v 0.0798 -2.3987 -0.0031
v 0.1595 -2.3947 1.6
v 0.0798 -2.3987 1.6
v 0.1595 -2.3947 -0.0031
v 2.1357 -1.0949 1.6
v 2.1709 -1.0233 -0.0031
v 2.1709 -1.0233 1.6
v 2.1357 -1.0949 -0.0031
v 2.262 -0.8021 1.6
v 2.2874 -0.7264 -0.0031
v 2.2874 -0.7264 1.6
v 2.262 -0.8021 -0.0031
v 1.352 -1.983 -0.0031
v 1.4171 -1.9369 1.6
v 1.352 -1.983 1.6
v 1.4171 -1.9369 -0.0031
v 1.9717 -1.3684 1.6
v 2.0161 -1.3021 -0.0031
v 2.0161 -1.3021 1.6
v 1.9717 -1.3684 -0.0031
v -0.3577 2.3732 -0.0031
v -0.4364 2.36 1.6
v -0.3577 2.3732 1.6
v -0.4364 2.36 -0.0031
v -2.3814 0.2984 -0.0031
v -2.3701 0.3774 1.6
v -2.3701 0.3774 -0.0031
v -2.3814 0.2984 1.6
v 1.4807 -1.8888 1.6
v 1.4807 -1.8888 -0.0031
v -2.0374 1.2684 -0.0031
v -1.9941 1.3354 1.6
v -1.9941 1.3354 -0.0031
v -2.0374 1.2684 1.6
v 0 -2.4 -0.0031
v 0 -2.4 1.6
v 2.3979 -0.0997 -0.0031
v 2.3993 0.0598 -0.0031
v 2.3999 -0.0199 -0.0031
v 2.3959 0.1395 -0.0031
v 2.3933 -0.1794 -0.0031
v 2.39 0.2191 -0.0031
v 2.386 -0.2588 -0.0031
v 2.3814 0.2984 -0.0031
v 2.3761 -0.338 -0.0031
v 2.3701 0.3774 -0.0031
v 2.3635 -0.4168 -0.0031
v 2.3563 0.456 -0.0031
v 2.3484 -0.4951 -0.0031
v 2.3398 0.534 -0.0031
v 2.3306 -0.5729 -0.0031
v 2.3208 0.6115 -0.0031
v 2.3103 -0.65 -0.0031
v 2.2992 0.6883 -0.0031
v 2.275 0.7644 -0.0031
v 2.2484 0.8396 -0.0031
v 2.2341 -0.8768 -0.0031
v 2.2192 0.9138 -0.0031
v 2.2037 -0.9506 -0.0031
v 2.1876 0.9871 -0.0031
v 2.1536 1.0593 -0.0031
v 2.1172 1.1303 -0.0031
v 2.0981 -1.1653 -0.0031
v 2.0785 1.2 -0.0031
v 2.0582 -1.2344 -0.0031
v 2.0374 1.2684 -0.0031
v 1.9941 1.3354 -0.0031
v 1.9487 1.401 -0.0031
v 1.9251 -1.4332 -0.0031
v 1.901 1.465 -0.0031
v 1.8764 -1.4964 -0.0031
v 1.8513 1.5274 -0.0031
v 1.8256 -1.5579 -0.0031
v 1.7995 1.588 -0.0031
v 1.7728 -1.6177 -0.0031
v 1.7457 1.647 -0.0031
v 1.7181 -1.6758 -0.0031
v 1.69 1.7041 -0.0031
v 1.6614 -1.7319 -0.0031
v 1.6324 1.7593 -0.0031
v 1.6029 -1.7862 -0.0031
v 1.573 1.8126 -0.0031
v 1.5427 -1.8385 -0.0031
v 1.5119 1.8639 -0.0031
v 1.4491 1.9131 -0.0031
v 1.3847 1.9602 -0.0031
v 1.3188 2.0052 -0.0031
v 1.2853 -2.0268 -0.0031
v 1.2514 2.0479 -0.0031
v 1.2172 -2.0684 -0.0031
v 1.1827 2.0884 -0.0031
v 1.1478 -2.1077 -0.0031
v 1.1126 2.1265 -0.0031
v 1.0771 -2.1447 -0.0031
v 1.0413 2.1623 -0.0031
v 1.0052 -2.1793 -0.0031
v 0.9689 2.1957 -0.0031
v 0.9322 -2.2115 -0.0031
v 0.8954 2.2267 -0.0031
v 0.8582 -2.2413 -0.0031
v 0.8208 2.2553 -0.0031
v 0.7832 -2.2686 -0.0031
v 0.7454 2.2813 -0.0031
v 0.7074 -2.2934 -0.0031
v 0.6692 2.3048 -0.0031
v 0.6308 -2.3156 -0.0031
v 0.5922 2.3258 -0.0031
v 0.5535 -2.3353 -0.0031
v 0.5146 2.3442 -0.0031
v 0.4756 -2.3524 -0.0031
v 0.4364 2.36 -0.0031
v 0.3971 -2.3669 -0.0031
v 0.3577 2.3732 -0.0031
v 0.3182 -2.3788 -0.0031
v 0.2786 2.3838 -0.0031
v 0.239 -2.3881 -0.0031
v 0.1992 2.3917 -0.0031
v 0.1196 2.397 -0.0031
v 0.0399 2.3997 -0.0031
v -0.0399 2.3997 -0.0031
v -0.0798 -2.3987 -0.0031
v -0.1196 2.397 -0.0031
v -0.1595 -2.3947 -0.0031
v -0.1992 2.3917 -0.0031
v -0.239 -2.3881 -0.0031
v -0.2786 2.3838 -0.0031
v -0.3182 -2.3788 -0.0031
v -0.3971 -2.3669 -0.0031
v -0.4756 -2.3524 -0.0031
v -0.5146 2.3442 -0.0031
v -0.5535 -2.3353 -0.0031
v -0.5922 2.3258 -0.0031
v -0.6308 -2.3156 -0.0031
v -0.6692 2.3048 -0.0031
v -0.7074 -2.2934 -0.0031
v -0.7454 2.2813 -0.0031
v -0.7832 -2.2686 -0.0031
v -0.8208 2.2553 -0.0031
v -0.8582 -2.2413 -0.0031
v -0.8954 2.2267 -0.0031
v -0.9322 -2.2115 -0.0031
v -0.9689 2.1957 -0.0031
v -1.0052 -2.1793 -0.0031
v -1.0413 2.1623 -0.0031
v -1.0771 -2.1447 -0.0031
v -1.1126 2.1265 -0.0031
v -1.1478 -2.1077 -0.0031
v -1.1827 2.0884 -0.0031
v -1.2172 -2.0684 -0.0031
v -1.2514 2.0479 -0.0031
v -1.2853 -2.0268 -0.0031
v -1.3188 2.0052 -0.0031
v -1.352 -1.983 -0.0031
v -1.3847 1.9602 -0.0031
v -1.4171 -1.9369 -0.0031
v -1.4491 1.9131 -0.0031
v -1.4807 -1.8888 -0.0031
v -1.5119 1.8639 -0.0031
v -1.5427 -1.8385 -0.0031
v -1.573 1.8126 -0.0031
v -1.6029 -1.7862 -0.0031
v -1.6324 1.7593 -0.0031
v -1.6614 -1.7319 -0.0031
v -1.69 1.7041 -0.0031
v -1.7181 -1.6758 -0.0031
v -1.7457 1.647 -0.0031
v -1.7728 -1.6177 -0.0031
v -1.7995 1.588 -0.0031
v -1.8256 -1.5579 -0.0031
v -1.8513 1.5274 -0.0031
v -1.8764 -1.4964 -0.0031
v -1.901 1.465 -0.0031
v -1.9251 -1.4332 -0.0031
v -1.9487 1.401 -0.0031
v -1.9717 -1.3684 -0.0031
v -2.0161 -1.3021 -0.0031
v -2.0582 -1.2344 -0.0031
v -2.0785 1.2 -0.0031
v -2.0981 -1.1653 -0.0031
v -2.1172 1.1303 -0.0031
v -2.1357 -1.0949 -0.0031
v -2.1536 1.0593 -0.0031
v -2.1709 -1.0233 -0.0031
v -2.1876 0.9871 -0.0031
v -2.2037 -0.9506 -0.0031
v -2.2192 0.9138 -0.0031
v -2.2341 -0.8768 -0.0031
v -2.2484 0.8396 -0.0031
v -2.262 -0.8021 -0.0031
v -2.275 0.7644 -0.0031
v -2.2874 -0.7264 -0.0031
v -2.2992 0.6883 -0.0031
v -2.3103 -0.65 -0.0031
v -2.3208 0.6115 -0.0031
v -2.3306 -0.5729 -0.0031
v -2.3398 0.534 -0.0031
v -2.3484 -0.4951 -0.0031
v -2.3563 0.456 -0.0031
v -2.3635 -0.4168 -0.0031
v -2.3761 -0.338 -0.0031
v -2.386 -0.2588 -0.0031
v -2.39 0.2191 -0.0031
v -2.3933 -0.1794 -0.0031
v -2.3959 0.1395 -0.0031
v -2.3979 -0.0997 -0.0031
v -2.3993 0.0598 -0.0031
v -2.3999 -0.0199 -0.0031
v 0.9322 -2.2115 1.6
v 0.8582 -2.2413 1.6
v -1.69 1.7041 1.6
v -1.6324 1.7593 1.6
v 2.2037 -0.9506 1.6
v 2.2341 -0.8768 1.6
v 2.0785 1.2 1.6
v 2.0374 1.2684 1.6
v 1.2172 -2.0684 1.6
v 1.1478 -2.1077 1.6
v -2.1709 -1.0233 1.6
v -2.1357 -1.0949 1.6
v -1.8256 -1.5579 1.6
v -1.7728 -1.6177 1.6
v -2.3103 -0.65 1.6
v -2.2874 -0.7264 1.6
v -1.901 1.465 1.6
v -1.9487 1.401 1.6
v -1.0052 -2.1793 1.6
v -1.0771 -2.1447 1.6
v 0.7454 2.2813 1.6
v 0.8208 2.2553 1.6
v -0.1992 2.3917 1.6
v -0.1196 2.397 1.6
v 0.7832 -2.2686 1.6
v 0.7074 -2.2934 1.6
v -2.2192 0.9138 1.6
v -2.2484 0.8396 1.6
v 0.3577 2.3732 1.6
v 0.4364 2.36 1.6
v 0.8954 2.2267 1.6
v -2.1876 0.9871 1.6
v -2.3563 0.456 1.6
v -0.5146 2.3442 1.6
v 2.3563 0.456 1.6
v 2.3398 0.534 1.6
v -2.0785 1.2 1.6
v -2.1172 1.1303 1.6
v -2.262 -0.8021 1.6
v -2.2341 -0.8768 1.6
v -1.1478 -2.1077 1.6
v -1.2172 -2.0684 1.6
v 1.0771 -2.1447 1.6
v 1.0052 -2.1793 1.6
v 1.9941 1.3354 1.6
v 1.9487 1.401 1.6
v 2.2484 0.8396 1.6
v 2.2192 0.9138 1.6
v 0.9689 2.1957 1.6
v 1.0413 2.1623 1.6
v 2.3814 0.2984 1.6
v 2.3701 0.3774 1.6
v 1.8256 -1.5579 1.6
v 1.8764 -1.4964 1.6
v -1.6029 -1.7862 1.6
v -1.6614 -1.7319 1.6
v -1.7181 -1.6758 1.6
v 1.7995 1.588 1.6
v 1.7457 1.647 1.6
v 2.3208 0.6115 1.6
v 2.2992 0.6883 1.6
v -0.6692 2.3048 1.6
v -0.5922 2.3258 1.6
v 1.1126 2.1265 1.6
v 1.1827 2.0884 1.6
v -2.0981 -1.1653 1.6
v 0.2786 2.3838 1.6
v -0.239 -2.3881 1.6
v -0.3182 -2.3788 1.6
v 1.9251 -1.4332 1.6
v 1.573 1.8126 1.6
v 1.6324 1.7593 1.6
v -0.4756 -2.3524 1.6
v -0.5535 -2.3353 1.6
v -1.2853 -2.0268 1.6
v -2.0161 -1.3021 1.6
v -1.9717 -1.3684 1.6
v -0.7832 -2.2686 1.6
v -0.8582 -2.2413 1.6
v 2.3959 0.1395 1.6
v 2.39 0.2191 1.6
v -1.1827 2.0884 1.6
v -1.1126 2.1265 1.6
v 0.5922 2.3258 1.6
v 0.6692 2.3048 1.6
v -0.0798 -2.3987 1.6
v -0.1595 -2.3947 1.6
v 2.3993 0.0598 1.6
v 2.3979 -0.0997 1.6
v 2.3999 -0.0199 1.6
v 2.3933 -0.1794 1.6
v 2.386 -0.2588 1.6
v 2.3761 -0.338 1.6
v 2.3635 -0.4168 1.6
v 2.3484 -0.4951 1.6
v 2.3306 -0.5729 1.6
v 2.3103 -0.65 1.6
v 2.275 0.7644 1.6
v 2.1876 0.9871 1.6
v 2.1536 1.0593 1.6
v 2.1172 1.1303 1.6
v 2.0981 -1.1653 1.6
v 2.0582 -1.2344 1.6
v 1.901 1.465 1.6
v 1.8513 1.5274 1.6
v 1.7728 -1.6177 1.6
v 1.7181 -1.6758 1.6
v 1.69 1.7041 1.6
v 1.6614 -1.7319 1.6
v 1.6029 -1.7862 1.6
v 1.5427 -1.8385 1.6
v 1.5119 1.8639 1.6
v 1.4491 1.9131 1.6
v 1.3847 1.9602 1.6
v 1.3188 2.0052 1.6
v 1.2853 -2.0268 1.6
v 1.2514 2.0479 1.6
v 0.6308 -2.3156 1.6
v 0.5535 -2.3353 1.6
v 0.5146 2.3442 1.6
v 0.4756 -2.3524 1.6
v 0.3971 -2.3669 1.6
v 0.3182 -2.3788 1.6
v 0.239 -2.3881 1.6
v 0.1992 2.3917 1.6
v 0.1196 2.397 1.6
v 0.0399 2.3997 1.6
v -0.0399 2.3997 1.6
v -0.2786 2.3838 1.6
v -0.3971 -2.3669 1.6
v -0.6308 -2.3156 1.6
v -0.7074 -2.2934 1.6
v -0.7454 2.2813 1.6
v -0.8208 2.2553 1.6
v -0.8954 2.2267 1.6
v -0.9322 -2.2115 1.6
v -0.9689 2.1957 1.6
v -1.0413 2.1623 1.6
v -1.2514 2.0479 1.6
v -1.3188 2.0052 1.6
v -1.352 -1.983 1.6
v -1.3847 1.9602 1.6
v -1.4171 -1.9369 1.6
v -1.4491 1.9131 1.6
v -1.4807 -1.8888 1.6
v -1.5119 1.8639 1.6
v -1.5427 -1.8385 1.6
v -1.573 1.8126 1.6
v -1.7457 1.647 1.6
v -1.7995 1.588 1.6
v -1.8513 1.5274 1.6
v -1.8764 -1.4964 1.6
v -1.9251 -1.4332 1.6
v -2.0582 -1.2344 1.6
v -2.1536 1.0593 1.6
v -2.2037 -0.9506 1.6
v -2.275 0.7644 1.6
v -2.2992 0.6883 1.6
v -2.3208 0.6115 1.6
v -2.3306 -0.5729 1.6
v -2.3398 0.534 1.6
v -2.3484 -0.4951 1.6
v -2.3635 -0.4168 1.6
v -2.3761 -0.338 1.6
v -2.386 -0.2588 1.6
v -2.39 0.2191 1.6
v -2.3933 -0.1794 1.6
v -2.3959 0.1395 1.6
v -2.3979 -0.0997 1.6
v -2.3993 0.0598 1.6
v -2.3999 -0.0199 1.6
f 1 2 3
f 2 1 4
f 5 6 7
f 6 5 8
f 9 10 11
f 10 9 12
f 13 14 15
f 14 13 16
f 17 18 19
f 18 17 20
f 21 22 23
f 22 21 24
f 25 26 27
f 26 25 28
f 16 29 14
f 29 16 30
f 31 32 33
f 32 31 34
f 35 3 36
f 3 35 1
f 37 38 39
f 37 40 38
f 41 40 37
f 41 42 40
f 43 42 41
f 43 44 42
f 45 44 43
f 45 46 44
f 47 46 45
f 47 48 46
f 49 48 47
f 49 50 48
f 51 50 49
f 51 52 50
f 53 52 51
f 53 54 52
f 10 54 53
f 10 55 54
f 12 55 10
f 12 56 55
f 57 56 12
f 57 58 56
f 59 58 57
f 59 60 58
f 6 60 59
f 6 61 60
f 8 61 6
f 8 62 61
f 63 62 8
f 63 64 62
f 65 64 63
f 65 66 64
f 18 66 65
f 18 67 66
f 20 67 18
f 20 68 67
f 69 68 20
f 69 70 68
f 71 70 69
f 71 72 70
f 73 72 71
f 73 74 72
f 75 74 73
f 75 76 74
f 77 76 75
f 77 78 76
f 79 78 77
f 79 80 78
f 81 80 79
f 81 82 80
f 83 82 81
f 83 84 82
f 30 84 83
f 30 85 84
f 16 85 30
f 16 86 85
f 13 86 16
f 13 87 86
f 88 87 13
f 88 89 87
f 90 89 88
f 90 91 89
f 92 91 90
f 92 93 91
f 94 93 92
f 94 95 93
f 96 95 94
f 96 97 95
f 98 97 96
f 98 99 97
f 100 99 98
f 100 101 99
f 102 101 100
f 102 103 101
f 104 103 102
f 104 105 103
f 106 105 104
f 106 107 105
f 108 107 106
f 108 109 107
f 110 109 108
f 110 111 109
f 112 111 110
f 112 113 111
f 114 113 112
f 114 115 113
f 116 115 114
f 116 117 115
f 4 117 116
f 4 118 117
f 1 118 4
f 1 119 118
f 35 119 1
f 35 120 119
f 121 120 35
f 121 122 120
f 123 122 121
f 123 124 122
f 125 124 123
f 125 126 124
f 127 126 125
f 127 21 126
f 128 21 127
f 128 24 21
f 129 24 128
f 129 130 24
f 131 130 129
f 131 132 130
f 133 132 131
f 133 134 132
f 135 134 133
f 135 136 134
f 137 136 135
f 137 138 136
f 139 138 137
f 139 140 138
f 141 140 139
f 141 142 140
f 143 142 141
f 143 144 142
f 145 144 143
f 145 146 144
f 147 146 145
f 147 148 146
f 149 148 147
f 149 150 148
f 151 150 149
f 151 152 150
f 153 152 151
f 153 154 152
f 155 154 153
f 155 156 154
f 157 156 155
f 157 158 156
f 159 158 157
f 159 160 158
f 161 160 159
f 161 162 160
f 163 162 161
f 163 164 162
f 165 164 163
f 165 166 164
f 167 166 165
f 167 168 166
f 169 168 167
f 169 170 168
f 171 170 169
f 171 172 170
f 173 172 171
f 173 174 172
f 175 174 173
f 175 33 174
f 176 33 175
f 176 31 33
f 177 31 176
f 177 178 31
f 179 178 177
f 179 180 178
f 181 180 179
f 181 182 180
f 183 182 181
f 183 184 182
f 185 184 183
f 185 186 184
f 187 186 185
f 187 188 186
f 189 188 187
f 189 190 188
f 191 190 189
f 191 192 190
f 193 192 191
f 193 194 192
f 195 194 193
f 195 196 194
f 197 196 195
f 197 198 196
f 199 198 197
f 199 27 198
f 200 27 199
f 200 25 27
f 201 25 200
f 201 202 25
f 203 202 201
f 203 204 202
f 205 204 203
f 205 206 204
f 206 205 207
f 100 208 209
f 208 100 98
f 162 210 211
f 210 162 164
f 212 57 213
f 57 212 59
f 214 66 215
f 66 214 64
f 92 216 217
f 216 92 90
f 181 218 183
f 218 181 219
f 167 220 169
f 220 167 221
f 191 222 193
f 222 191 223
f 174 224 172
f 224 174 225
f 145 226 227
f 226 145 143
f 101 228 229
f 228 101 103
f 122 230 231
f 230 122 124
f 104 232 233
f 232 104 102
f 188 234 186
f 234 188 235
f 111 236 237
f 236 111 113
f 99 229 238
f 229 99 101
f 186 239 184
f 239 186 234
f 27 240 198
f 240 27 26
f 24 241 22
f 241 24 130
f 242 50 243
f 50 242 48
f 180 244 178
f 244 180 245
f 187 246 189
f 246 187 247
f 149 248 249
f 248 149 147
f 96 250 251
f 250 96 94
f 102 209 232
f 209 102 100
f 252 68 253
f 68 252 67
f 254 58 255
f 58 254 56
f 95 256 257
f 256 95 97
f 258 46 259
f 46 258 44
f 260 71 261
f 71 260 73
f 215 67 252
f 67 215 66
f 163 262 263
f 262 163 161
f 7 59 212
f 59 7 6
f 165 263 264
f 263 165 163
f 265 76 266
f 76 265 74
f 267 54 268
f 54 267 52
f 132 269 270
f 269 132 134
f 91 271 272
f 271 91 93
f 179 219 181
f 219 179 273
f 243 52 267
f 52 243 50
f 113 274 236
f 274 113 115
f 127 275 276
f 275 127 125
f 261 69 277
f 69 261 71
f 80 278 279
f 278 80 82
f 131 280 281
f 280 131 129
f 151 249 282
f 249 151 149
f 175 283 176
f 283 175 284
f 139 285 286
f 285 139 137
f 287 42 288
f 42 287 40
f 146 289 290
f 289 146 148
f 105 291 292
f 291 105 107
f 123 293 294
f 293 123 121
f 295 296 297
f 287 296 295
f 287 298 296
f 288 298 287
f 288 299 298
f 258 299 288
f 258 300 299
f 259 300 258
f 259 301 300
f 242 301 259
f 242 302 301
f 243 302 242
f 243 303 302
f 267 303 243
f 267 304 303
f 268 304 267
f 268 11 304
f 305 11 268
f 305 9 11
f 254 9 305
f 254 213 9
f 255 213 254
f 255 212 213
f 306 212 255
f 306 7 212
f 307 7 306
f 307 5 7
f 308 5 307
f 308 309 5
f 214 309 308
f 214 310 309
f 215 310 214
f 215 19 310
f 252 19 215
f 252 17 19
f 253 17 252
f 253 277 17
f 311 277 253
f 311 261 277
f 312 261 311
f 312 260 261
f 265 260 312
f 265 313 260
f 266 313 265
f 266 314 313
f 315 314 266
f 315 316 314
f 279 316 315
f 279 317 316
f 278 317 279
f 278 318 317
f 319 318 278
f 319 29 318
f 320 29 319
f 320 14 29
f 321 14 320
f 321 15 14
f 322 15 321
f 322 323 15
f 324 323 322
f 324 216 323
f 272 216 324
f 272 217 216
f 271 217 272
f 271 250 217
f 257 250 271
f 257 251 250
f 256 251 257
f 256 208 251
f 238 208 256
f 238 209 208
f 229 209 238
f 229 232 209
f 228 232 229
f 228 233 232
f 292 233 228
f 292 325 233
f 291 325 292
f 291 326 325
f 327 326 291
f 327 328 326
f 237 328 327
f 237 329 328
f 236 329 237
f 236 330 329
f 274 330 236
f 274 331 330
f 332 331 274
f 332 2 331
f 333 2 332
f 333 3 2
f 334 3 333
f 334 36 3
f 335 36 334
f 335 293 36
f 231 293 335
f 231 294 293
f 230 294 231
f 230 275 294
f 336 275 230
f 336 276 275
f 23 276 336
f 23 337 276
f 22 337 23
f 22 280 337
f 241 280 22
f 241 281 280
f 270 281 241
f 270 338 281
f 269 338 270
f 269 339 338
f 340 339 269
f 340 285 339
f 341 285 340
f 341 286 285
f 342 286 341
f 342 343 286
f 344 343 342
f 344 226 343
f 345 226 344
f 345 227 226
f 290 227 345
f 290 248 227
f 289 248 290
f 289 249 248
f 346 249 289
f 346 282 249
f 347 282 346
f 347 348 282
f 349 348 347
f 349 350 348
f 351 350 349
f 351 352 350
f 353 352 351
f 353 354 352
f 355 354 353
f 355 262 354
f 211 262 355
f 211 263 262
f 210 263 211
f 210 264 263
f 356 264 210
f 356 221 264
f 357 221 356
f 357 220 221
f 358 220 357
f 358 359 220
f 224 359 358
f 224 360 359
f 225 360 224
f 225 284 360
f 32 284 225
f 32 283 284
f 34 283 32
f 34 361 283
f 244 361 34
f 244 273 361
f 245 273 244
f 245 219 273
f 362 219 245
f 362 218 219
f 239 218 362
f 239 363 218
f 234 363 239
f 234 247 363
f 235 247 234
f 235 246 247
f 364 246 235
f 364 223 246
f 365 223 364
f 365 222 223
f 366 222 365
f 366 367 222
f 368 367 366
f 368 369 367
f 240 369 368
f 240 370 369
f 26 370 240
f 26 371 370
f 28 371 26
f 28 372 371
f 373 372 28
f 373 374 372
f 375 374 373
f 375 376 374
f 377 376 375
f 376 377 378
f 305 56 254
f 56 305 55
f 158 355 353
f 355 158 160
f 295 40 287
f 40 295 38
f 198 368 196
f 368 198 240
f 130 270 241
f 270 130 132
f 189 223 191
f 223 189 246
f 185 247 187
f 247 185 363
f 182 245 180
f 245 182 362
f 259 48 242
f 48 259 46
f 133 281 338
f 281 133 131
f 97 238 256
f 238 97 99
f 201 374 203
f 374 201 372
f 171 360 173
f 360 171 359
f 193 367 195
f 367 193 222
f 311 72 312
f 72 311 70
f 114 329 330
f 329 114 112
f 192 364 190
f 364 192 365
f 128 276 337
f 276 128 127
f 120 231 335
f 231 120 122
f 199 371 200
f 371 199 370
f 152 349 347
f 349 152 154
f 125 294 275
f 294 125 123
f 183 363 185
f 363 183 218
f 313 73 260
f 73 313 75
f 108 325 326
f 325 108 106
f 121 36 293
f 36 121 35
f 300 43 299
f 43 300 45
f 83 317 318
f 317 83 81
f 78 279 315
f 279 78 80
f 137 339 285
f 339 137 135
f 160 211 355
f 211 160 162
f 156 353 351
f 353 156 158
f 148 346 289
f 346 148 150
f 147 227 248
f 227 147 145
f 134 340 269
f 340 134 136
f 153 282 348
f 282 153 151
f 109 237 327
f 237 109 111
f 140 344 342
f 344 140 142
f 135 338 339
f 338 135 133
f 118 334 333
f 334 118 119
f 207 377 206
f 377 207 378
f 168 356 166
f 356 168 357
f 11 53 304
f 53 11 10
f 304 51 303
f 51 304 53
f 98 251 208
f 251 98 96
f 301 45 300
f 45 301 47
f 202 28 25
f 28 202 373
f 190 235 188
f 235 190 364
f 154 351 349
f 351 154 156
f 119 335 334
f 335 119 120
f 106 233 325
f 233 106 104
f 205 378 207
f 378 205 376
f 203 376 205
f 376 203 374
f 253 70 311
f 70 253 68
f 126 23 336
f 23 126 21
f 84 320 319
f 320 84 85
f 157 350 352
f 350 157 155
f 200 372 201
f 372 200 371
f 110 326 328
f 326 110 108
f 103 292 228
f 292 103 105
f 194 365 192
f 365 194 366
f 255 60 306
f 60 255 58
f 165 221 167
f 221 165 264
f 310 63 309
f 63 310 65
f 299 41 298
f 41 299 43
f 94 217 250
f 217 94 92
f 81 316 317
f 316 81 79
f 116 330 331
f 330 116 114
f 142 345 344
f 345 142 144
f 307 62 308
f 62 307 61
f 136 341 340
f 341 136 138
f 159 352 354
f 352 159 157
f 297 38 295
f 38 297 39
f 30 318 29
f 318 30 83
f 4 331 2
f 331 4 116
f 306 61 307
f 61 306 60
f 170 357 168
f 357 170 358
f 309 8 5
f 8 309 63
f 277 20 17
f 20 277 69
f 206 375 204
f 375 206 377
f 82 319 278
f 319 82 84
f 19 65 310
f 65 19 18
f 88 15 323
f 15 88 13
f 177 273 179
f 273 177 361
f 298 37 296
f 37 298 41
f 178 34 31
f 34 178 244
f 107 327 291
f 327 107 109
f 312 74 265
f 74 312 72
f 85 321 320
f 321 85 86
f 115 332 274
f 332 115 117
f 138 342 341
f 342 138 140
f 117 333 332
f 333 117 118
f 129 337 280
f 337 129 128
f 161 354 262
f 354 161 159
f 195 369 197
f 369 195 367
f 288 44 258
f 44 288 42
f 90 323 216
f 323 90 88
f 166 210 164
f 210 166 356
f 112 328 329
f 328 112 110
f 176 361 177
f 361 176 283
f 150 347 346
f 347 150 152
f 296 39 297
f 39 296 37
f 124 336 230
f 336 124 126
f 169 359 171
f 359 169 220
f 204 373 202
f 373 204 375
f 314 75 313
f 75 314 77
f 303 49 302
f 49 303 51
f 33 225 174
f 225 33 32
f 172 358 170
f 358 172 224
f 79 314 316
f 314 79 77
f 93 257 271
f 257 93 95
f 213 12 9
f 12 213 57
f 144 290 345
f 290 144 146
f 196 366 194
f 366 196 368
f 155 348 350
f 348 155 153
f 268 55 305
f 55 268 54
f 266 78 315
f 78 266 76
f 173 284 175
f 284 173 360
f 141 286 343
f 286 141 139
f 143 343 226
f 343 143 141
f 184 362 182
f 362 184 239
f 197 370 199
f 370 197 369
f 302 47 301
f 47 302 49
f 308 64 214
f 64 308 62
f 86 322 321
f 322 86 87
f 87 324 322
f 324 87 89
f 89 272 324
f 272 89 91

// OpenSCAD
use <../../lib.scad>
use <../../p/box3u2p.scad>
use <../../p/box4-1.scad>
use <../../p/box4-2p.scad>
use <../../p/box5-1.scad>
use <../../p/rect1.scad>
use <../../p/rect3.scad>
use <../../p/recte3.scad>
use <../../p/stud.scad>
$fa=1; $fs=0.2;
function ldraw_lib__s__24008s01(realsolid=false) = [
// 0 ~Plate  1 x  1 with Head Cuboid with Nose and Ears without Front
// 0 Name: s\24008s01.dat
// 0 Author: Merlijn Wissink [legolijntje]
// 0 !LDRAW_ORG Subpart UPDATE 2019-03
// 0 !LICENSE Licensed under CC BY 2.0 and CC BY 4.0 : see CAreadme.txt
// 
// 0 BFC CERTIFY CCW
  [0,"BFC","CERTIFY"],
  [0,"BFC","CCW"],
// 
// 0 !HISTORY 2016-03-18 {LEGO Digital Designer} Original part shape
// 0 !HISTORY 2016-06-20 [legolijntje] File preparation for LDraw Parts Tracker
// 0 !HISTORY 2016-09-26 [MMR1988] Fixed t-junctions
// 0 !HISTORY 2019-12-27 [PTadmin] Official Update 2019-03
// 
// 
// 1 16 0 0 0 1 0 0 0 1 0 0 0 1 stud.dat
  [1,16,0,0,0,1,0,0,0,1,0,0,0,1, ldraw_lib__stud(realsolid)],
// 1 16 0 8 0 10 0 0 0 -8 0 0 0 10 box4-1.dat
  [1,16,0,8,0,10,0,0,0,-8,0,0,0,10, ldraw_lib__box4_1(realsolid)],
// 0 BFC INVERTNEXT
  [0,"BFC","INVERTNEXT"],
// 1 16 0 8 -2 6 0 0 0 -5 0 0 0 8 box4-1.dat
  [1,16,0,8,-2,6,0,0,0,-5,0,0,0,8, ldraw_lib__box4_1(realsolid)],
// 1 16 12 -2 -22.5 0 -1 0 0 0 10 12.5 0 0 rect3.dat
  [1,16,12,-2,-22.5,0,-1,0,0,0,10,12.5,0,0, ldraw_lib__rect3(realsolid)],
// 1 16 -12 -2 -22.5 0 1 0 0 0 10 12.5 0 0 rect3.dat
  [1,16,-12,-2,-22.5,0,1,0,0,0,10,12.5,0,0, ldraw_lib__rect3(realsolid)],
// 1 16 0 -12 -22.5 -12 0 0 0 1 0 0 0 -12.5 recte3.dat
  [1,16,0,-12,-22.5,-12,0,0,0,1,0,0,0,-12.5, ldraw_lib__recte3(realsolid)],
// 1 16 0 -12 -14.5 0 0 -6 0 1 0 4.5 0 0 rect1.dat
  [1,16,0,-12,-14.5,0,0,-6,0,1,0,4.5,0,0, ldraw_lib__rect1(realsolid)],
// 4 16 12 -12 -10 10 -12 -10 10 -12 -19 12 -12 -35
  [4,16,12,-12,-10,10,-12,-10,10,-12,-19,12,-12,-35],
// 3 16 12 -12 -35 10 -12 -19 6 -12 -19
  [3,16,12,-12,-35,10,-12,-19,6,-12,-19],
// 4 16 12 -12 -35 6 -12 -19 -6 -12 -19 -12 -12 -35
  [4,16,12,-12,-35,6,-12,-19,-6,-12,-19,-12,-12,-35],
// 3 16 -6 -12 -19 -10 -12 -19 -12 -12 -35
  [3,16,-6,-12,-19,-10,-12,-19,-12,-12,-35],
// 4 16 -12 -12 -35 -10 -12 -19 -10 -12 -10 -12 -12 -10
  [4,16,-12,-12,-35,-10,-12,-19,-10,-12,-10,-12,-12,-10],
// 4 16 6 8 6 10 8 10 10 8 -10 6 8 -10
  [4,16,6,8,6,10,8,10,10,8,-10,6,8,-10],
// 4 16 -10 8 10 -6 8 6 -6 8 -10 -10 8 -10
  [4,16,-10,8,10,-6,8,6,-6,8,-10,-10,8,-10],
// 4 16 10 8 10 6 8 6 -6 8 6 -10 8 10
  [4,16,10,8,10,6,8,6,-6,8,6,-10,8,10],
// 1 16 0 5.5 -10 1.5 0 0 0 0 2.5 0 4 0 box4-2p.dat
  [1,16,0,5.5,-10,1.5,0,0,0,0,2.5,0,4,0, ldraw_lib__box4_2p(realsolid)],
// 0 BFC INVERTNEXT
  [0,"BFC","INVERTNEXT"],
// 1 16 0 8 -22.5 8 0 0 0 -17 0 0 0 8.5 box4-1.dat
  [1,16,0,8,-22.5,8,0,0,0,-17,0,0,0,8.5, ldraw_lib__box4_1(realsolid)],
// 0 BFC INVERTNEXT
  [0,"BFC","INVERTNEXT"],
// 1 16 0 8 -33 -2.5 0 0 0 -5 0 0 0 -2 box4-1.dat
  [1,16,0,8,-33,-2.5,0,0,0,-5,0,0,0,-2, ldraw_lib__box4_1(realsolid)],
// 1 16 0 8 -37 0 0 6 0 -8 0 2 0 0 box3u2p.dat
  [1,16,0,8,-37,0,0,6,0,-8,0,2,0,0, ldraw_lib__box3u2p(realsolid)],
// 1 16 8 -12 -14.5 2 0 0 0 -4.5 0 0 0 -4.5 box5-1.dat
  [1,16,8,-12,-14.5,2,0,0,0,-4.5,0,0,0,-4.5, ldraw_lib__box5_1(realsolid)],
// 1 16 -8 -12 -14.5 2 0 0 0 -4.5 0 0 0 -4.5 box5-1.dat
  [1,16,-8,-12,-14.5,2,0,0,0,-4.5,0,0,0,-4.5, ldraw_lib__box5_1(realsolid)],
// 3 16 12 8 -10 8 8 -14 10 8 -10
  [3,16,12,8,-10,8,8,-14,10,8,-10],
// 3 16 10 8 -10 8 8 -14 6 8 -10
  [3,16,10,8,-10,8,8,-14,6,8,-10],
// 3 16 6 8 -10 8 8 -14 1.5 8 -10
  [3,16,6,8,-10,8,8,-14,1.5,8,-10],
// 4 16 8 8 -14 -8 8 -14 -1.5 8 -10 1.5 8 -10
  [4,16,8,8,-14,-8,8,-14,-1.5,8,-10,1.5,8,-10],
// 3 16 -1.5 8 -10 -8 8 -14 -6 8 -10
  [3,16,-1.5,8,-10,-8,8,-14,-6,8,-10],
// 3 16 -6 8 -10 -8 8 -14 -10 8 -10
  [3,16,-6,8,-10,-8,8,-14,-10,8,-10],
// 3 16 -10 8 -10 -8 8 -14 -12 8 -10
  [3,16,-10,8,-10,-8,8,-14,-12,8,-10],
// 4 16 8 8 -31 8 8 -14 12 8 -10 12 8 -35
  [4,16,8,8,-31,8,8,-14,12,8,-10,12,8,-35],
// 4 16 -12 8 -35 -12 8 -10 -8 8 -14 -8 8 -31
  [4,16,-12,8,-35,-12,8,-10,-8,8,-14,-8,8,-31],
// 4 16 8 -9 -31 2.5 3 -31 -2.5 3 -31 -8 -9 -31
  [4,16,8,-9,-31,2.5,3,-31,-2.5,3,-31,-8,-9,-31],
// 4 16 2.5 8 -31 2.5 3 -31 8 -9 -31 8 8 -31
  [4,16,2.5,8,-31,2.5,3,-31,8,-9,-31,8,8,-31],
// 4 16 -2.5 8 -31 -8 8 -31 -8 -9 -31 -2.5 3 -31
  [4,16,-2.5,8,-31,-8,8,-31,-8,-9,-31,-2.5,3,-31],
// 4 16 -12 8 -35 -8 8 -31 -2.5 8 -31 -6 8 -35
  [4,16,-12,8,-35,-8,8,-31,-2.5,8,-31,-6,8,-35],
// 4 16 6 8 -35 2.5 8 -31 8 8 -31 12 8 -35
  [4,16,6,8,-35,2.5,8,-31,8,8,-31,12,8,-35],
// 4 16 -2.5 8 -31 -2.5 8 -35 -6 8 -39 -6 8 -35
  [4,16,-2.5,8,-31,-2.5,8,-35,-6,8,-39,-6,8,-35],
// 4 16 6 8 -35 6 8 -39 2.5 8 -35 2.5 8 -31
  [4,16,6,8,-35,6,8,-39,2.5,8,-35,2.5,8,-31],
// 4 16 6 8 -39 -6 8 -39 -2.5 8 -35 2.5 8 -35
  [4,16,6,8,-39,-6,8,-39,-2.5,8,-35,2.5,8,-35],
// 1 16 -3.75 5.5 -10 0 0 -2.25 2.5 0 0 0 -1 0 rect1.dat
  [1,16,-3.75,5.5,-10,0,0,-2.25,2.5,0,0,0,-1,0, ldraw_lib__rect1(realsolid)],
// 1 16 3.75 5.5 -10 0 0 -2.25 2.5 0 0 0 -1 0 rect1.dat
  [1,16,3.75,5.5,-10,0,0,-2.25,2.5,0,0,0,-1,0, ldraw_lib__rect1(realsolid)],
// 3 16 6 -12 -10 10 -12 -10 10 0 -10
  [3,16,6,-12,-10,10,-12,-10,10,0,-10],
// 4 16 12 8 -10 10 8 -10 10 0 -10 12 -12 -10
  [4,16,12,8,-10,10,8,-10,10,0,-10,12,-12,-10],
// 4 16 -10 8 -10 -12 8 -10 -12 -12 -10 -10 0 -10
  [4,16,-10,8,-10,-12,8,-10,-12,-12,-10,-10,0,-10],
// 3 16 -12 -12 -10 -10 -12 -10 -10 0 -10
  [3,16,-12,-12,-10,-10,-12,-10,-10,0,-10],
// 3 16 -10 0 -10 -10 -12 -10 -6 -12 -10
  [3,16,-10,0,-10,-10,-12,-10,-6,-12,-10],
// 3 16 10 -12 -10 12 -12 -10 10 0 -10
  [3,16,10,-12,-10,12,-12,-10,10,0,-10],
// 4 16 -6 -12 -10 6 -12 -10 10 0 -10 -10 0 -10
  [4,16,-6,-12,-10,6,-12,-10,10,0,-10,-10,0,-10],
// 2 24 12 8 -10 10 8 -10
  [2,24,12,8,-10,10,8,-10],
// 2 24 -10 8 -10 -12 8 -10
  [2,24,-10,8,-10,-12,8,-10],
// 2 24 12 -12 -10 10 -12 -10
  [2,24,12,-12,-10,10,-12,-10],
// 2 24 -10 -12 -10 -12 -12 -10
  [2,24,-10,-12,-10,-12,-12,-10],
// 2 24 6 8 -39 -6 8 -39
  [2,24,6,8,-39,-6,8,-39],
// 2 24 2.5 8 -31 8 8 -31
  [2,24,2.5,8,-31,8,8,-31],
// 2 24 6 8 -35 12 8 -35
  [2,24,6,8,-35,12,8,-35],
// 2 24 -8 8 -31 -2.5 8 -31
  [2,24,-8,8,-31,-2.5,8,-31],
// 2 24 -12 8 -35 -6 8 -35
  [2,24,-12,8,-35,-6,8,-35],
];
module ldraw_lib__s__24008s01(step=0, col=false, unit=2/5, alt=false, line=0.2, solid=!$preview)
    makepoly(ldraw_lib__s__24008s01(solid), step=step, col=col, unit=unit, alt=alt, line=line, solid=solid);
ldraw_lib__s__24008s01(line=0.2);
